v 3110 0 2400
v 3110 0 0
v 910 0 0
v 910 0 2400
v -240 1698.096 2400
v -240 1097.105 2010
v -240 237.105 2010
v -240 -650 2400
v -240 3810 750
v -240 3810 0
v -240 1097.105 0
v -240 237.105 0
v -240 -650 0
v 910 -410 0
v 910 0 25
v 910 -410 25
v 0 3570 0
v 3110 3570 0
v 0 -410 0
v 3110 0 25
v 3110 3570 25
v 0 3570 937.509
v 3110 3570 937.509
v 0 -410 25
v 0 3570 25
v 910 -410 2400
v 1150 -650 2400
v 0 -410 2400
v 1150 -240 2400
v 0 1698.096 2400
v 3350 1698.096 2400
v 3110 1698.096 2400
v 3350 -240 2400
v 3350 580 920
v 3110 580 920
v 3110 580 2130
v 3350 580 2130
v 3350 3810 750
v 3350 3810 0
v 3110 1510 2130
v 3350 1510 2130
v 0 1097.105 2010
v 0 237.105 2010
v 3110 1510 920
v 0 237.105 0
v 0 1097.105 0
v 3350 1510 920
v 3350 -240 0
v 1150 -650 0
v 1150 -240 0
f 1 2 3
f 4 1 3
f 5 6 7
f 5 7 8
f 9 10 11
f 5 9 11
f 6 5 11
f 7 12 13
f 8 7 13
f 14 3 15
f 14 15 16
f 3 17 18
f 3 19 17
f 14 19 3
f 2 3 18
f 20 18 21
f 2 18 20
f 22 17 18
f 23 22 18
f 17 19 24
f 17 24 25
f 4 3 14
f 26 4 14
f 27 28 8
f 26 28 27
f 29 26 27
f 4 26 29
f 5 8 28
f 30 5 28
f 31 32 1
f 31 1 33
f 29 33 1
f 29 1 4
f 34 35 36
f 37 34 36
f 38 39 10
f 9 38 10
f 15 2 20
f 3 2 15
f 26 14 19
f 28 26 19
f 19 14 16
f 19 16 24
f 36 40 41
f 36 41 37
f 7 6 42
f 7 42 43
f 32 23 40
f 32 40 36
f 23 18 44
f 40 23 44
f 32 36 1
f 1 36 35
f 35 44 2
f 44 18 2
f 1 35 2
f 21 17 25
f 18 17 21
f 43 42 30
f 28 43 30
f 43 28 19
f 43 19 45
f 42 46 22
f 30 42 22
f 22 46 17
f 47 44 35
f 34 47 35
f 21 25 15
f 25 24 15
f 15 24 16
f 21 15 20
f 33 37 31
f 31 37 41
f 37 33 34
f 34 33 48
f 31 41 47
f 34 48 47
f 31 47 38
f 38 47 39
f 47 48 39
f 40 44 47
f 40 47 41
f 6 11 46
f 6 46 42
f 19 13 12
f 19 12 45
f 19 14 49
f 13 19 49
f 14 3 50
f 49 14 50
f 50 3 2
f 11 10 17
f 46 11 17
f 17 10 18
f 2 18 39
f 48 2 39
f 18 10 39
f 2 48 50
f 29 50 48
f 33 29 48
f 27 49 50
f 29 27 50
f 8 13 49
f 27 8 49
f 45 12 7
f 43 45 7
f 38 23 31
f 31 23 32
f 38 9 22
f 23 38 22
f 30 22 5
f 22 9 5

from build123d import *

# Parameters (mm, degrees)
F1_DEPTH = 2400
F2_W     = 860
F2_H     = 2010
F3_DEPTH = 240
F5_DEPTH = 3590.001
F6_W     = 930
F6_H     = 1210
F7_DEPTH = 240
F9_DEPTH = 25


with BuildPart() as f1:
    # F0 (on Top) → F1 (new body)
    with BuildSketch(Plane.XY):
        Polygon((-240, 3810), (-240, -650), (1150, -650), (1150, -240), (3350, -240), (3350, 3810), align=None)
        Polygon((3110, 0), (910, 0), (910, -410), (0, -410), (0, 0), (0, 3570), (3110, 3570), align=None, mode=Mode.SUBTRACT)
    extrude(amount=F1_DEPTH)

    # F2 (on face) → F3 (cut, through all)
    with BuildSketch(Plane(origin=(-240, 0, 0), x_dir=(0, -1, 0), z_dir=(-1, 0, 0))):
        with Locations((-667.104549, 1005)):
            Rectangle(F2_W, F2_H)
    extrude(amount=-F3_DEPTH, mode=Mode.SUBTRACT)

    # F4 (on face) → F5 (cut, through all)
    with BuildSketch(Plane(origin=(-240, 0, 0), x_dir=(0, -1, 0), z_dir=(-1, 0, 0))):
        Polygon((-3810, 2400), (-3810, 750), (-1698.096307, 2400), align=None)
    extrude(amount=-F5_DEPTH, mode=Mode.SUBTRACT)

    # F6 (on face) → F7 (cut, through all)
    with BuildSketch(Plane(origin=(3110, 0, 0), x_dir=(0, -1, 0), z_dir=(-1, 0, 0))):
        with Locations((-1045, 1525)):
            Rectangle(F6_W, F6_H)
    extrude(amount=-F7_DEPTH, mode=Mode.SUBTRACT)


with BuildPart() as f9:
    # F8 (on face) → F9 (new body)
    with BuildSketch(Plane(origin=(0, 0, 0), x_dir=(1, 0, 0), z_dir=(0, 0, -1))):
        Polygon((0, -237.104549), (0, -1097.104549), (0, -3570), (3110, -3570), (3110, 0), (910, 0), (910, 410), (0, 410), align=None)
    extrude(amount=-F9_DEPTH)


solid = Compound([f1.part, f9.part])
